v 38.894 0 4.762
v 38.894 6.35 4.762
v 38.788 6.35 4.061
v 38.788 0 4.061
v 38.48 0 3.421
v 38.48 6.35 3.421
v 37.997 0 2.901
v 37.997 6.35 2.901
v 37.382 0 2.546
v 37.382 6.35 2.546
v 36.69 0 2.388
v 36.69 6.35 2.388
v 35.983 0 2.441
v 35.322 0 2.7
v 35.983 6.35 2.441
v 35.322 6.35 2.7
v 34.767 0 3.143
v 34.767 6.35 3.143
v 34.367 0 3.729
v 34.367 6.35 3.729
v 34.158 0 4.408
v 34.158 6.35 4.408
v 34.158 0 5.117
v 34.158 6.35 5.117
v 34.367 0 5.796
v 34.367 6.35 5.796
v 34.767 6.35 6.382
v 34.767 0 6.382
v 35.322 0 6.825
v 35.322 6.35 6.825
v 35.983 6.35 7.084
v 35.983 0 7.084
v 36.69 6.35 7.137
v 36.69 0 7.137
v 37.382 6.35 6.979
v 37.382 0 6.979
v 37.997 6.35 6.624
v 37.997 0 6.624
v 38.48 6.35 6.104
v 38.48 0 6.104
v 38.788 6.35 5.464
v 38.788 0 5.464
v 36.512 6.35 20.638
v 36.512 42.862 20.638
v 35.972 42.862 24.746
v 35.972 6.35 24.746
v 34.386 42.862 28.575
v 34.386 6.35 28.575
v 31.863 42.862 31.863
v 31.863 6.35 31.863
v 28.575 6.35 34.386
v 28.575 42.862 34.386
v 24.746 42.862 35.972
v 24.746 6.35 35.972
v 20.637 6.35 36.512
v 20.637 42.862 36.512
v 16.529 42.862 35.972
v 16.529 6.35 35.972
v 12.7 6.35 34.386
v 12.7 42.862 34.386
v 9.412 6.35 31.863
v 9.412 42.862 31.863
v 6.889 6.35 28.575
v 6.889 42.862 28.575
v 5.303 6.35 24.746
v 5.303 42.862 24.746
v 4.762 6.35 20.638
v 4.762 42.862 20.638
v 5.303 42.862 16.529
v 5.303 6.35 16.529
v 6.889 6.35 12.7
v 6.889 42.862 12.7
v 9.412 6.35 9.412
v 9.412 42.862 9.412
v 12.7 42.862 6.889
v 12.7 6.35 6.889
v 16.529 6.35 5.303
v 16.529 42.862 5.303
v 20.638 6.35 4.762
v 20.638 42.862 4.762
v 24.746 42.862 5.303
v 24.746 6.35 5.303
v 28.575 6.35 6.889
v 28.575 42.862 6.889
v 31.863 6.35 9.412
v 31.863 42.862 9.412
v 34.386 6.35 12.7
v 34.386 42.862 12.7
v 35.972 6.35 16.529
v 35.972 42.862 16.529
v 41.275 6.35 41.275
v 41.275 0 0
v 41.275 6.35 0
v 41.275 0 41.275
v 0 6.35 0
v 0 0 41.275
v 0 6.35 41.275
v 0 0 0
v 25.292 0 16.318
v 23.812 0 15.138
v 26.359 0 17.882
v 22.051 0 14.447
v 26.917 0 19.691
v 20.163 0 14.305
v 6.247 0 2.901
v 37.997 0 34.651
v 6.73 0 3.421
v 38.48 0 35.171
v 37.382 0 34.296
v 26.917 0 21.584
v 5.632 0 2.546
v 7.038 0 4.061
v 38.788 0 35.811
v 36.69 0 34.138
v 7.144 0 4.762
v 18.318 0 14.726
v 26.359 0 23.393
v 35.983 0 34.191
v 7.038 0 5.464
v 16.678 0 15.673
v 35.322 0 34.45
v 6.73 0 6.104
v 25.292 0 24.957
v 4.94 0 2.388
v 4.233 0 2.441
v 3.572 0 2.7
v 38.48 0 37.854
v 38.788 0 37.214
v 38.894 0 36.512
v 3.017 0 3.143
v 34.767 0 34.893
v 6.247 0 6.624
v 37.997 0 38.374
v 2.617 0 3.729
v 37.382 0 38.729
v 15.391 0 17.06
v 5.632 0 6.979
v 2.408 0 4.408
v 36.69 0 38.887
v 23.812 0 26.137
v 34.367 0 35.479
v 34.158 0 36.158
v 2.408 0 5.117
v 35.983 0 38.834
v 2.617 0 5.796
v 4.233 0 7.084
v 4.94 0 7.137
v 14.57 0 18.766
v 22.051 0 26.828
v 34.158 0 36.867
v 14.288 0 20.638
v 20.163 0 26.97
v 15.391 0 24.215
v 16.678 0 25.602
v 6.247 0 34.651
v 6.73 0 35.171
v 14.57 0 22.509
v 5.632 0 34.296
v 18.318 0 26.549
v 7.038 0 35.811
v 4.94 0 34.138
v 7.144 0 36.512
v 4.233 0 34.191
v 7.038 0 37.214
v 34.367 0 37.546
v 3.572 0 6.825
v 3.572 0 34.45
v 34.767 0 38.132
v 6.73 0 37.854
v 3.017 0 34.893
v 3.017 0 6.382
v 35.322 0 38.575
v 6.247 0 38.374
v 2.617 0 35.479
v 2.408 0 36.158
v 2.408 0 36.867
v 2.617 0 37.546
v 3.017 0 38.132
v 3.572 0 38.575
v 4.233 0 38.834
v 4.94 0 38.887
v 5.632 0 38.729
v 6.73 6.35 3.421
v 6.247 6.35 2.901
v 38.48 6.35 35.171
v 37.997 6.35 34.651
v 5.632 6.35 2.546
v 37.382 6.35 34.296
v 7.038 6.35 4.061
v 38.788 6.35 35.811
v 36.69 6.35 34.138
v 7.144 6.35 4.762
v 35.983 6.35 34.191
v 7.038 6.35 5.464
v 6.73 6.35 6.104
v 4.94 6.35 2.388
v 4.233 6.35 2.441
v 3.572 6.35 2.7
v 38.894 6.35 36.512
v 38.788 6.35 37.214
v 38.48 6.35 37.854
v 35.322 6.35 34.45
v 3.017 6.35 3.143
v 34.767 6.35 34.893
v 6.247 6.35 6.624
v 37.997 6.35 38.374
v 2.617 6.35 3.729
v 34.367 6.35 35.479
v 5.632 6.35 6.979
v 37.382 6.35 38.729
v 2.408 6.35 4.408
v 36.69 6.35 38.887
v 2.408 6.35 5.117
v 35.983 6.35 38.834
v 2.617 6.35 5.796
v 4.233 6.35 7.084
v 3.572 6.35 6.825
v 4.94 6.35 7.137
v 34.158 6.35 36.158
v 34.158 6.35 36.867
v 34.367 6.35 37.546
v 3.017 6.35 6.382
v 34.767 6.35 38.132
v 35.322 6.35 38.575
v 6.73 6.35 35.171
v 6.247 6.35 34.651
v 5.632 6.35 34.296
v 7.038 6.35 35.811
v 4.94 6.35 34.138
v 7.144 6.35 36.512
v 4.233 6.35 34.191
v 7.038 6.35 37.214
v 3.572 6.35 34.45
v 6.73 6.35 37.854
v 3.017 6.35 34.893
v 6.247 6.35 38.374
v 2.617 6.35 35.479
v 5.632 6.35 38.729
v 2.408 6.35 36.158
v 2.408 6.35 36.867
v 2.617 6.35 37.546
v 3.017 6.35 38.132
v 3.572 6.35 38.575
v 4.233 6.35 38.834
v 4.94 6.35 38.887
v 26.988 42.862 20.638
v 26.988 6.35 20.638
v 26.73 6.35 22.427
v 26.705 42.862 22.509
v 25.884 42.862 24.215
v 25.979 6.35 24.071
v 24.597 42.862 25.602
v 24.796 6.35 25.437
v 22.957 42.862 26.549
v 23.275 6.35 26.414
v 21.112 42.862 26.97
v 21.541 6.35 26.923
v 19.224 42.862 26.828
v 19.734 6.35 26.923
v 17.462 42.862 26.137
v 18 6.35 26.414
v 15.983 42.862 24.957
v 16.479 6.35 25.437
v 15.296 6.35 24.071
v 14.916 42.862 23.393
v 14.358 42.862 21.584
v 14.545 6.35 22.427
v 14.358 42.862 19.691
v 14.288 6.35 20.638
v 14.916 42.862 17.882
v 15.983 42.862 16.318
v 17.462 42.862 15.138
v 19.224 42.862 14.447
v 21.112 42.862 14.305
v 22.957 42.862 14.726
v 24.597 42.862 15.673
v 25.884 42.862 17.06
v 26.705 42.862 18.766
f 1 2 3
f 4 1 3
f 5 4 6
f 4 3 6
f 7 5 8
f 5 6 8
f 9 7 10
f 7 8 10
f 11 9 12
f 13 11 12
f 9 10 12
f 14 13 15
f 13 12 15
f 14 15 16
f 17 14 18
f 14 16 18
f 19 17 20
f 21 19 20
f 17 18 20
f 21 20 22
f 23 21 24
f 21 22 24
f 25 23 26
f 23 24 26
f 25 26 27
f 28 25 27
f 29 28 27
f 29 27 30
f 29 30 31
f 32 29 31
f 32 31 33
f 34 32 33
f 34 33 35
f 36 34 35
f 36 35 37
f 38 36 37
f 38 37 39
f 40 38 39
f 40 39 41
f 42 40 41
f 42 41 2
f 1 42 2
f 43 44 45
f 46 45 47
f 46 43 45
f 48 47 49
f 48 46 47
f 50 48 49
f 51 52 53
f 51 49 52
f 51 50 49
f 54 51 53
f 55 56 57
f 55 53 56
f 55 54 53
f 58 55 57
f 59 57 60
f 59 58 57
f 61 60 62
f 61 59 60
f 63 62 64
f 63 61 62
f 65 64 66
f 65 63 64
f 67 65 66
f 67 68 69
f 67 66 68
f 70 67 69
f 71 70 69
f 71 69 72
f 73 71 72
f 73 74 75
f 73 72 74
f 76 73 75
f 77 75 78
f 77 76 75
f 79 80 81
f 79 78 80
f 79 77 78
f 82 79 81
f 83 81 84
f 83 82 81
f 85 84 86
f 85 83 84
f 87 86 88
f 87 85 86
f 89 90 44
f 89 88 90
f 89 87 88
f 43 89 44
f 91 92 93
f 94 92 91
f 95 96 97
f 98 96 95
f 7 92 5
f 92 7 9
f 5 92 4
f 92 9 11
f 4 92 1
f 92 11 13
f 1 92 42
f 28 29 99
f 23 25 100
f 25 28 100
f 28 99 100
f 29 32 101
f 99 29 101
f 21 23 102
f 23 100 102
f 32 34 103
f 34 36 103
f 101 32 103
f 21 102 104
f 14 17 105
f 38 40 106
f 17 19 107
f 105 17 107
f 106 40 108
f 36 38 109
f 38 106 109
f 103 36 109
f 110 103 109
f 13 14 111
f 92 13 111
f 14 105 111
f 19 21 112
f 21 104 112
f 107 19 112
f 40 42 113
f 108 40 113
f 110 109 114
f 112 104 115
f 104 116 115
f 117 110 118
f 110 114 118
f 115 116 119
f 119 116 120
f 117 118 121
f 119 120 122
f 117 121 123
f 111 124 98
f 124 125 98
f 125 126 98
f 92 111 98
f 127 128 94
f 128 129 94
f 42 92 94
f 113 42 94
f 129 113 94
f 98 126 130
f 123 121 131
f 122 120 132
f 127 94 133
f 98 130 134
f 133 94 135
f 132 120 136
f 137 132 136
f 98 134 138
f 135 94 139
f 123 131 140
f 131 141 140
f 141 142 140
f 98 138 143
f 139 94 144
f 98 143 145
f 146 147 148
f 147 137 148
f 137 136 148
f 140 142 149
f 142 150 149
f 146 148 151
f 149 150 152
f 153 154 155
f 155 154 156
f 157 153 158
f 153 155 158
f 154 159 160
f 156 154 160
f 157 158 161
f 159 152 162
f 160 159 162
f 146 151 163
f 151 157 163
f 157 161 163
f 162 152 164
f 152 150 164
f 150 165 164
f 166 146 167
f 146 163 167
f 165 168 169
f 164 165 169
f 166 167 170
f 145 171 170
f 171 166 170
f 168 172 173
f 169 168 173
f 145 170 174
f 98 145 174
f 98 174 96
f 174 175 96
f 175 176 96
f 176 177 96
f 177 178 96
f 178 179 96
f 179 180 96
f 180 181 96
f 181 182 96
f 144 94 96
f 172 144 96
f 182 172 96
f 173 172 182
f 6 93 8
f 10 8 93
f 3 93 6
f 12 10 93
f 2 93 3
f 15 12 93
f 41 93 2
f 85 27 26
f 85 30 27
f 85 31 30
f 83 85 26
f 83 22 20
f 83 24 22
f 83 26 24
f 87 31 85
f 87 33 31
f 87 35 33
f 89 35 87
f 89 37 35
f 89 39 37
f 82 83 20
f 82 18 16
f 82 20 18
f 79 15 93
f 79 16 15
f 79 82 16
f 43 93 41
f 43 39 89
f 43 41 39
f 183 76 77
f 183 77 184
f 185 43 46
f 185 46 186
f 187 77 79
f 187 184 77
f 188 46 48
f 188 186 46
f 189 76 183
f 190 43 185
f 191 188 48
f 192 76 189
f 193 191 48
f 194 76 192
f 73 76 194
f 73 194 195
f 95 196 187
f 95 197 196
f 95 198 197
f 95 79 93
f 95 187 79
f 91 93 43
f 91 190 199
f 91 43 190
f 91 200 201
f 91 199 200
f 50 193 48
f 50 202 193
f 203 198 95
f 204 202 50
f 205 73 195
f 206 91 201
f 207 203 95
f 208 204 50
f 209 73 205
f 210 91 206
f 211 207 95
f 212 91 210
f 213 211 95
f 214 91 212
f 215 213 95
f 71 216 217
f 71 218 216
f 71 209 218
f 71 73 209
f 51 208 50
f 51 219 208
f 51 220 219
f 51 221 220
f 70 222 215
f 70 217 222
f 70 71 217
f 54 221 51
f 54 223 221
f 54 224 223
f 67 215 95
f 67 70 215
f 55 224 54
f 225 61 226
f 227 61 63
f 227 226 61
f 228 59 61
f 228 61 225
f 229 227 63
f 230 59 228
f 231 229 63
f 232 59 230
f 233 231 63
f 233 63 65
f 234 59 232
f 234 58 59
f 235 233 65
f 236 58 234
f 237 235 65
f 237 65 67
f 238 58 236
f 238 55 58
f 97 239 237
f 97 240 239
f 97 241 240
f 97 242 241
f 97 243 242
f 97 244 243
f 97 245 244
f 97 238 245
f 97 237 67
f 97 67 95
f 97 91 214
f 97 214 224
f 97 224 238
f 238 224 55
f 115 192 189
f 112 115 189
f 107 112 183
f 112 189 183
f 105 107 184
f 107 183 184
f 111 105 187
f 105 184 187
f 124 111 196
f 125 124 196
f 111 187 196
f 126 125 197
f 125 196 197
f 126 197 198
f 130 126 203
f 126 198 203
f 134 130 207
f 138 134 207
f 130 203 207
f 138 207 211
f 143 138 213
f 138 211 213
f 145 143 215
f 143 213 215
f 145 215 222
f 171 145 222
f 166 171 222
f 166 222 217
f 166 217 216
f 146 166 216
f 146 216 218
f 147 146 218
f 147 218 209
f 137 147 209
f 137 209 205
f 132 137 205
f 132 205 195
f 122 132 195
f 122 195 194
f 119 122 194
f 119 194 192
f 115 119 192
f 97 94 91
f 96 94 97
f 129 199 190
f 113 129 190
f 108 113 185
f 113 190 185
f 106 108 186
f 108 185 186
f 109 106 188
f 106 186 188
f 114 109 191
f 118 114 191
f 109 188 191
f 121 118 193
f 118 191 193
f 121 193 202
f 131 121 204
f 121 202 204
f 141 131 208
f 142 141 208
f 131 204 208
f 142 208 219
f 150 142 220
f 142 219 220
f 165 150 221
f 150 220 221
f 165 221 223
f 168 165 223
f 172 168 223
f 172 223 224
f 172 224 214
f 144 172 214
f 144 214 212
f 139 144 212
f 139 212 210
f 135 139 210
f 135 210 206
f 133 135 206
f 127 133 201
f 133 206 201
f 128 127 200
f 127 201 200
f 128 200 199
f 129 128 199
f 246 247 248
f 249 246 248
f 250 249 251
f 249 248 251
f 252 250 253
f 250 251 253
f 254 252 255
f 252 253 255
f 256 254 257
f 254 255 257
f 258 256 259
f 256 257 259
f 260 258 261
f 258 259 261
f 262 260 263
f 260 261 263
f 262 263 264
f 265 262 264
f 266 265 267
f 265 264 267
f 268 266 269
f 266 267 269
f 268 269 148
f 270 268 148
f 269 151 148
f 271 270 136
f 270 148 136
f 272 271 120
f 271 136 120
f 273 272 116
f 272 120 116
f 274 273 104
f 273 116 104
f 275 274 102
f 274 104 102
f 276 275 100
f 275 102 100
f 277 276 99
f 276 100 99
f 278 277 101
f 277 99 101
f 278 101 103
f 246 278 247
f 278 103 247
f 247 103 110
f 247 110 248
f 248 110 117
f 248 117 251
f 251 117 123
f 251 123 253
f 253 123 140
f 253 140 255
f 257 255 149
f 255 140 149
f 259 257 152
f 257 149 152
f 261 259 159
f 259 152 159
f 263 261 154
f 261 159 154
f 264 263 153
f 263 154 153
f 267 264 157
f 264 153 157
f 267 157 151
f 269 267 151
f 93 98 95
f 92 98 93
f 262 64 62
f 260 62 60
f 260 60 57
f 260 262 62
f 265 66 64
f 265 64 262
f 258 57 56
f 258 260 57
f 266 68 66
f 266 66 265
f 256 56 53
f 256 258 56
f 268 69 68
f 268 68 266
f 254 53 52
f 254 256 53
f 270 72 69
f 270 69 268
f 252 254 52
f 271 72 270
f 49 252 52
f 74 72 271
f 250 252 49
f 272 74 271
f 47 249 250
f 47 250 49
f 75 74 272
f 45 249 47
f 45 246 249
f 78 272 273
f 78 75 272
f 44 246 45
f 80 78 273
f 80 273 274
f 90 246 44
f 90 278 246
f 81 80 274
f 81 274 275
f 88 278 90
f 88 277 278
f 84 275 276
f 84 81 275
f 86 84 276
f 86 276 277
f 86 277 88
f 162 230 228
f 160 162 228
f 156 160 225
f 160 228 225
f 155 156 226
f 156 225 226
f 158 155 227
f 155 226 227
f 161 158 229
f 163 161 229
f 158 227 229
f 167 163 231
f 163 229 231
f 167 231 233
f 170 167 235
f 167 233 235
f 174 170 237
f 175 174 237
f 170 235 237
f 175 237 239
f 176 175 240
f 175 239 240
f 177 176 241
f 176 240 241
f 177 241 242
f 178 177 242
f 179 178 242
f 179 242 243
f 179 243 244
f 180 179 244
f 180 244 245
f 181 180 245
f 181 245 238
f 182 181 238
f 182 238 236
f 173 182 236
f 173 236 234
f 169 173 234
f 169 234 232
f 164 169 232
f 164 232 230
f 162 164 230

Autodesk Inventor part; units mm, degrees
ref_plane "YZ Plane" through (0, 0, 0) normal (1, 0, 0) x (0, 1, 0)
ref_plane "XZ Plane" through (0, 0, 0) normal (0, 1, 0) x (-1, 0, 0)
ref_plane "XY Plane" through (0, 0, 0) normal (0, 0, 1) x (1, 0, 0)
sketch "Sketch1" plane through (0, 0, 0) normal (0, 1, 0) x (-1, 0, 0)
  line L0 (0, 0) -> (-41.275, 0)
  line L1 (-41.275, 0) -> (-41.275, 41.275)
  line L2 (-41.275, 41.275) -> (0, 41.275)
  line L3 (0, 41.275) -> (0, 0)
  circle A0 centre (-20.6375, 20.6375) radius 6.35
  line L4 (0, 41.275) -> (-41.275, 0) construction
  line L5 (-41.275, 41.275) -> (0, 0) construction
  dimension "d0" = 41.275
  dimension "d1" = 41.275
  dimension "d15" = 12.7
extrude "Extrusion1" add sketch "Sketch1" along normal blind 6.35
sketch "Sketch2" plane through (0, 6.35, 0) normal (0, 1, 0) x (1, 0, 0)
  circle A0 centre (20.6375, -20.6375) radius 6.35
  circle A1 centre (20.6375, -20.6375) radius 15.875
  dimension "d4" = 12.7
  dimension "d5" = 31.75
extrude "Extrusion2" add sketch "Sketch2" along normal blind 36.5125
sketch "Sketch3" plane through (0, 6.35, 0) normal (0, 1, 0) x (1, 0, 0)
  line L0 (0, -41.275) -> (41.275, -41.275) projected
  line L1 (41.275, -41.275) -> (41.275, 0) projected
  circle A0 centre (20.6375, -20.6375) radius 15.875 projected
  circle A1 centre (4.7625, -4.7625) radius 2.3813
  circle A2 centre (36.5125, -4.7625) radius 2.3813
  circle A3 centre (36.5125, -36.5125) radius 2.3813
  circle A4 centre (4.7625, -36.5125) radius 2.3813
  line L2 (4.7625, -36.5125) -> (4.7625, -4.7625) construction
  line L3 (4.7625, -4.7625) -> (36.5125, -4.7625) construction
  line L4 (36.5125, -4.7625) -> (36.5125, -36.5125) construction
  line L5 (36.5125, -36.5125) -> (4.7625, -36.5125) construction
  dimension "d8" = 4.7625
  dimension "d10" = 31.75
  dimension "d11" = 15.875
  dimension "d12" = 15.875
extrude "Extrusion3" cut sketch "Sketch3" against normal blind 36.5125 contours A1 | A2 | A3 | A4
properties part number "Flange Mount Linear Bearing (McMaster Part #64825K11)" material "Steel"
